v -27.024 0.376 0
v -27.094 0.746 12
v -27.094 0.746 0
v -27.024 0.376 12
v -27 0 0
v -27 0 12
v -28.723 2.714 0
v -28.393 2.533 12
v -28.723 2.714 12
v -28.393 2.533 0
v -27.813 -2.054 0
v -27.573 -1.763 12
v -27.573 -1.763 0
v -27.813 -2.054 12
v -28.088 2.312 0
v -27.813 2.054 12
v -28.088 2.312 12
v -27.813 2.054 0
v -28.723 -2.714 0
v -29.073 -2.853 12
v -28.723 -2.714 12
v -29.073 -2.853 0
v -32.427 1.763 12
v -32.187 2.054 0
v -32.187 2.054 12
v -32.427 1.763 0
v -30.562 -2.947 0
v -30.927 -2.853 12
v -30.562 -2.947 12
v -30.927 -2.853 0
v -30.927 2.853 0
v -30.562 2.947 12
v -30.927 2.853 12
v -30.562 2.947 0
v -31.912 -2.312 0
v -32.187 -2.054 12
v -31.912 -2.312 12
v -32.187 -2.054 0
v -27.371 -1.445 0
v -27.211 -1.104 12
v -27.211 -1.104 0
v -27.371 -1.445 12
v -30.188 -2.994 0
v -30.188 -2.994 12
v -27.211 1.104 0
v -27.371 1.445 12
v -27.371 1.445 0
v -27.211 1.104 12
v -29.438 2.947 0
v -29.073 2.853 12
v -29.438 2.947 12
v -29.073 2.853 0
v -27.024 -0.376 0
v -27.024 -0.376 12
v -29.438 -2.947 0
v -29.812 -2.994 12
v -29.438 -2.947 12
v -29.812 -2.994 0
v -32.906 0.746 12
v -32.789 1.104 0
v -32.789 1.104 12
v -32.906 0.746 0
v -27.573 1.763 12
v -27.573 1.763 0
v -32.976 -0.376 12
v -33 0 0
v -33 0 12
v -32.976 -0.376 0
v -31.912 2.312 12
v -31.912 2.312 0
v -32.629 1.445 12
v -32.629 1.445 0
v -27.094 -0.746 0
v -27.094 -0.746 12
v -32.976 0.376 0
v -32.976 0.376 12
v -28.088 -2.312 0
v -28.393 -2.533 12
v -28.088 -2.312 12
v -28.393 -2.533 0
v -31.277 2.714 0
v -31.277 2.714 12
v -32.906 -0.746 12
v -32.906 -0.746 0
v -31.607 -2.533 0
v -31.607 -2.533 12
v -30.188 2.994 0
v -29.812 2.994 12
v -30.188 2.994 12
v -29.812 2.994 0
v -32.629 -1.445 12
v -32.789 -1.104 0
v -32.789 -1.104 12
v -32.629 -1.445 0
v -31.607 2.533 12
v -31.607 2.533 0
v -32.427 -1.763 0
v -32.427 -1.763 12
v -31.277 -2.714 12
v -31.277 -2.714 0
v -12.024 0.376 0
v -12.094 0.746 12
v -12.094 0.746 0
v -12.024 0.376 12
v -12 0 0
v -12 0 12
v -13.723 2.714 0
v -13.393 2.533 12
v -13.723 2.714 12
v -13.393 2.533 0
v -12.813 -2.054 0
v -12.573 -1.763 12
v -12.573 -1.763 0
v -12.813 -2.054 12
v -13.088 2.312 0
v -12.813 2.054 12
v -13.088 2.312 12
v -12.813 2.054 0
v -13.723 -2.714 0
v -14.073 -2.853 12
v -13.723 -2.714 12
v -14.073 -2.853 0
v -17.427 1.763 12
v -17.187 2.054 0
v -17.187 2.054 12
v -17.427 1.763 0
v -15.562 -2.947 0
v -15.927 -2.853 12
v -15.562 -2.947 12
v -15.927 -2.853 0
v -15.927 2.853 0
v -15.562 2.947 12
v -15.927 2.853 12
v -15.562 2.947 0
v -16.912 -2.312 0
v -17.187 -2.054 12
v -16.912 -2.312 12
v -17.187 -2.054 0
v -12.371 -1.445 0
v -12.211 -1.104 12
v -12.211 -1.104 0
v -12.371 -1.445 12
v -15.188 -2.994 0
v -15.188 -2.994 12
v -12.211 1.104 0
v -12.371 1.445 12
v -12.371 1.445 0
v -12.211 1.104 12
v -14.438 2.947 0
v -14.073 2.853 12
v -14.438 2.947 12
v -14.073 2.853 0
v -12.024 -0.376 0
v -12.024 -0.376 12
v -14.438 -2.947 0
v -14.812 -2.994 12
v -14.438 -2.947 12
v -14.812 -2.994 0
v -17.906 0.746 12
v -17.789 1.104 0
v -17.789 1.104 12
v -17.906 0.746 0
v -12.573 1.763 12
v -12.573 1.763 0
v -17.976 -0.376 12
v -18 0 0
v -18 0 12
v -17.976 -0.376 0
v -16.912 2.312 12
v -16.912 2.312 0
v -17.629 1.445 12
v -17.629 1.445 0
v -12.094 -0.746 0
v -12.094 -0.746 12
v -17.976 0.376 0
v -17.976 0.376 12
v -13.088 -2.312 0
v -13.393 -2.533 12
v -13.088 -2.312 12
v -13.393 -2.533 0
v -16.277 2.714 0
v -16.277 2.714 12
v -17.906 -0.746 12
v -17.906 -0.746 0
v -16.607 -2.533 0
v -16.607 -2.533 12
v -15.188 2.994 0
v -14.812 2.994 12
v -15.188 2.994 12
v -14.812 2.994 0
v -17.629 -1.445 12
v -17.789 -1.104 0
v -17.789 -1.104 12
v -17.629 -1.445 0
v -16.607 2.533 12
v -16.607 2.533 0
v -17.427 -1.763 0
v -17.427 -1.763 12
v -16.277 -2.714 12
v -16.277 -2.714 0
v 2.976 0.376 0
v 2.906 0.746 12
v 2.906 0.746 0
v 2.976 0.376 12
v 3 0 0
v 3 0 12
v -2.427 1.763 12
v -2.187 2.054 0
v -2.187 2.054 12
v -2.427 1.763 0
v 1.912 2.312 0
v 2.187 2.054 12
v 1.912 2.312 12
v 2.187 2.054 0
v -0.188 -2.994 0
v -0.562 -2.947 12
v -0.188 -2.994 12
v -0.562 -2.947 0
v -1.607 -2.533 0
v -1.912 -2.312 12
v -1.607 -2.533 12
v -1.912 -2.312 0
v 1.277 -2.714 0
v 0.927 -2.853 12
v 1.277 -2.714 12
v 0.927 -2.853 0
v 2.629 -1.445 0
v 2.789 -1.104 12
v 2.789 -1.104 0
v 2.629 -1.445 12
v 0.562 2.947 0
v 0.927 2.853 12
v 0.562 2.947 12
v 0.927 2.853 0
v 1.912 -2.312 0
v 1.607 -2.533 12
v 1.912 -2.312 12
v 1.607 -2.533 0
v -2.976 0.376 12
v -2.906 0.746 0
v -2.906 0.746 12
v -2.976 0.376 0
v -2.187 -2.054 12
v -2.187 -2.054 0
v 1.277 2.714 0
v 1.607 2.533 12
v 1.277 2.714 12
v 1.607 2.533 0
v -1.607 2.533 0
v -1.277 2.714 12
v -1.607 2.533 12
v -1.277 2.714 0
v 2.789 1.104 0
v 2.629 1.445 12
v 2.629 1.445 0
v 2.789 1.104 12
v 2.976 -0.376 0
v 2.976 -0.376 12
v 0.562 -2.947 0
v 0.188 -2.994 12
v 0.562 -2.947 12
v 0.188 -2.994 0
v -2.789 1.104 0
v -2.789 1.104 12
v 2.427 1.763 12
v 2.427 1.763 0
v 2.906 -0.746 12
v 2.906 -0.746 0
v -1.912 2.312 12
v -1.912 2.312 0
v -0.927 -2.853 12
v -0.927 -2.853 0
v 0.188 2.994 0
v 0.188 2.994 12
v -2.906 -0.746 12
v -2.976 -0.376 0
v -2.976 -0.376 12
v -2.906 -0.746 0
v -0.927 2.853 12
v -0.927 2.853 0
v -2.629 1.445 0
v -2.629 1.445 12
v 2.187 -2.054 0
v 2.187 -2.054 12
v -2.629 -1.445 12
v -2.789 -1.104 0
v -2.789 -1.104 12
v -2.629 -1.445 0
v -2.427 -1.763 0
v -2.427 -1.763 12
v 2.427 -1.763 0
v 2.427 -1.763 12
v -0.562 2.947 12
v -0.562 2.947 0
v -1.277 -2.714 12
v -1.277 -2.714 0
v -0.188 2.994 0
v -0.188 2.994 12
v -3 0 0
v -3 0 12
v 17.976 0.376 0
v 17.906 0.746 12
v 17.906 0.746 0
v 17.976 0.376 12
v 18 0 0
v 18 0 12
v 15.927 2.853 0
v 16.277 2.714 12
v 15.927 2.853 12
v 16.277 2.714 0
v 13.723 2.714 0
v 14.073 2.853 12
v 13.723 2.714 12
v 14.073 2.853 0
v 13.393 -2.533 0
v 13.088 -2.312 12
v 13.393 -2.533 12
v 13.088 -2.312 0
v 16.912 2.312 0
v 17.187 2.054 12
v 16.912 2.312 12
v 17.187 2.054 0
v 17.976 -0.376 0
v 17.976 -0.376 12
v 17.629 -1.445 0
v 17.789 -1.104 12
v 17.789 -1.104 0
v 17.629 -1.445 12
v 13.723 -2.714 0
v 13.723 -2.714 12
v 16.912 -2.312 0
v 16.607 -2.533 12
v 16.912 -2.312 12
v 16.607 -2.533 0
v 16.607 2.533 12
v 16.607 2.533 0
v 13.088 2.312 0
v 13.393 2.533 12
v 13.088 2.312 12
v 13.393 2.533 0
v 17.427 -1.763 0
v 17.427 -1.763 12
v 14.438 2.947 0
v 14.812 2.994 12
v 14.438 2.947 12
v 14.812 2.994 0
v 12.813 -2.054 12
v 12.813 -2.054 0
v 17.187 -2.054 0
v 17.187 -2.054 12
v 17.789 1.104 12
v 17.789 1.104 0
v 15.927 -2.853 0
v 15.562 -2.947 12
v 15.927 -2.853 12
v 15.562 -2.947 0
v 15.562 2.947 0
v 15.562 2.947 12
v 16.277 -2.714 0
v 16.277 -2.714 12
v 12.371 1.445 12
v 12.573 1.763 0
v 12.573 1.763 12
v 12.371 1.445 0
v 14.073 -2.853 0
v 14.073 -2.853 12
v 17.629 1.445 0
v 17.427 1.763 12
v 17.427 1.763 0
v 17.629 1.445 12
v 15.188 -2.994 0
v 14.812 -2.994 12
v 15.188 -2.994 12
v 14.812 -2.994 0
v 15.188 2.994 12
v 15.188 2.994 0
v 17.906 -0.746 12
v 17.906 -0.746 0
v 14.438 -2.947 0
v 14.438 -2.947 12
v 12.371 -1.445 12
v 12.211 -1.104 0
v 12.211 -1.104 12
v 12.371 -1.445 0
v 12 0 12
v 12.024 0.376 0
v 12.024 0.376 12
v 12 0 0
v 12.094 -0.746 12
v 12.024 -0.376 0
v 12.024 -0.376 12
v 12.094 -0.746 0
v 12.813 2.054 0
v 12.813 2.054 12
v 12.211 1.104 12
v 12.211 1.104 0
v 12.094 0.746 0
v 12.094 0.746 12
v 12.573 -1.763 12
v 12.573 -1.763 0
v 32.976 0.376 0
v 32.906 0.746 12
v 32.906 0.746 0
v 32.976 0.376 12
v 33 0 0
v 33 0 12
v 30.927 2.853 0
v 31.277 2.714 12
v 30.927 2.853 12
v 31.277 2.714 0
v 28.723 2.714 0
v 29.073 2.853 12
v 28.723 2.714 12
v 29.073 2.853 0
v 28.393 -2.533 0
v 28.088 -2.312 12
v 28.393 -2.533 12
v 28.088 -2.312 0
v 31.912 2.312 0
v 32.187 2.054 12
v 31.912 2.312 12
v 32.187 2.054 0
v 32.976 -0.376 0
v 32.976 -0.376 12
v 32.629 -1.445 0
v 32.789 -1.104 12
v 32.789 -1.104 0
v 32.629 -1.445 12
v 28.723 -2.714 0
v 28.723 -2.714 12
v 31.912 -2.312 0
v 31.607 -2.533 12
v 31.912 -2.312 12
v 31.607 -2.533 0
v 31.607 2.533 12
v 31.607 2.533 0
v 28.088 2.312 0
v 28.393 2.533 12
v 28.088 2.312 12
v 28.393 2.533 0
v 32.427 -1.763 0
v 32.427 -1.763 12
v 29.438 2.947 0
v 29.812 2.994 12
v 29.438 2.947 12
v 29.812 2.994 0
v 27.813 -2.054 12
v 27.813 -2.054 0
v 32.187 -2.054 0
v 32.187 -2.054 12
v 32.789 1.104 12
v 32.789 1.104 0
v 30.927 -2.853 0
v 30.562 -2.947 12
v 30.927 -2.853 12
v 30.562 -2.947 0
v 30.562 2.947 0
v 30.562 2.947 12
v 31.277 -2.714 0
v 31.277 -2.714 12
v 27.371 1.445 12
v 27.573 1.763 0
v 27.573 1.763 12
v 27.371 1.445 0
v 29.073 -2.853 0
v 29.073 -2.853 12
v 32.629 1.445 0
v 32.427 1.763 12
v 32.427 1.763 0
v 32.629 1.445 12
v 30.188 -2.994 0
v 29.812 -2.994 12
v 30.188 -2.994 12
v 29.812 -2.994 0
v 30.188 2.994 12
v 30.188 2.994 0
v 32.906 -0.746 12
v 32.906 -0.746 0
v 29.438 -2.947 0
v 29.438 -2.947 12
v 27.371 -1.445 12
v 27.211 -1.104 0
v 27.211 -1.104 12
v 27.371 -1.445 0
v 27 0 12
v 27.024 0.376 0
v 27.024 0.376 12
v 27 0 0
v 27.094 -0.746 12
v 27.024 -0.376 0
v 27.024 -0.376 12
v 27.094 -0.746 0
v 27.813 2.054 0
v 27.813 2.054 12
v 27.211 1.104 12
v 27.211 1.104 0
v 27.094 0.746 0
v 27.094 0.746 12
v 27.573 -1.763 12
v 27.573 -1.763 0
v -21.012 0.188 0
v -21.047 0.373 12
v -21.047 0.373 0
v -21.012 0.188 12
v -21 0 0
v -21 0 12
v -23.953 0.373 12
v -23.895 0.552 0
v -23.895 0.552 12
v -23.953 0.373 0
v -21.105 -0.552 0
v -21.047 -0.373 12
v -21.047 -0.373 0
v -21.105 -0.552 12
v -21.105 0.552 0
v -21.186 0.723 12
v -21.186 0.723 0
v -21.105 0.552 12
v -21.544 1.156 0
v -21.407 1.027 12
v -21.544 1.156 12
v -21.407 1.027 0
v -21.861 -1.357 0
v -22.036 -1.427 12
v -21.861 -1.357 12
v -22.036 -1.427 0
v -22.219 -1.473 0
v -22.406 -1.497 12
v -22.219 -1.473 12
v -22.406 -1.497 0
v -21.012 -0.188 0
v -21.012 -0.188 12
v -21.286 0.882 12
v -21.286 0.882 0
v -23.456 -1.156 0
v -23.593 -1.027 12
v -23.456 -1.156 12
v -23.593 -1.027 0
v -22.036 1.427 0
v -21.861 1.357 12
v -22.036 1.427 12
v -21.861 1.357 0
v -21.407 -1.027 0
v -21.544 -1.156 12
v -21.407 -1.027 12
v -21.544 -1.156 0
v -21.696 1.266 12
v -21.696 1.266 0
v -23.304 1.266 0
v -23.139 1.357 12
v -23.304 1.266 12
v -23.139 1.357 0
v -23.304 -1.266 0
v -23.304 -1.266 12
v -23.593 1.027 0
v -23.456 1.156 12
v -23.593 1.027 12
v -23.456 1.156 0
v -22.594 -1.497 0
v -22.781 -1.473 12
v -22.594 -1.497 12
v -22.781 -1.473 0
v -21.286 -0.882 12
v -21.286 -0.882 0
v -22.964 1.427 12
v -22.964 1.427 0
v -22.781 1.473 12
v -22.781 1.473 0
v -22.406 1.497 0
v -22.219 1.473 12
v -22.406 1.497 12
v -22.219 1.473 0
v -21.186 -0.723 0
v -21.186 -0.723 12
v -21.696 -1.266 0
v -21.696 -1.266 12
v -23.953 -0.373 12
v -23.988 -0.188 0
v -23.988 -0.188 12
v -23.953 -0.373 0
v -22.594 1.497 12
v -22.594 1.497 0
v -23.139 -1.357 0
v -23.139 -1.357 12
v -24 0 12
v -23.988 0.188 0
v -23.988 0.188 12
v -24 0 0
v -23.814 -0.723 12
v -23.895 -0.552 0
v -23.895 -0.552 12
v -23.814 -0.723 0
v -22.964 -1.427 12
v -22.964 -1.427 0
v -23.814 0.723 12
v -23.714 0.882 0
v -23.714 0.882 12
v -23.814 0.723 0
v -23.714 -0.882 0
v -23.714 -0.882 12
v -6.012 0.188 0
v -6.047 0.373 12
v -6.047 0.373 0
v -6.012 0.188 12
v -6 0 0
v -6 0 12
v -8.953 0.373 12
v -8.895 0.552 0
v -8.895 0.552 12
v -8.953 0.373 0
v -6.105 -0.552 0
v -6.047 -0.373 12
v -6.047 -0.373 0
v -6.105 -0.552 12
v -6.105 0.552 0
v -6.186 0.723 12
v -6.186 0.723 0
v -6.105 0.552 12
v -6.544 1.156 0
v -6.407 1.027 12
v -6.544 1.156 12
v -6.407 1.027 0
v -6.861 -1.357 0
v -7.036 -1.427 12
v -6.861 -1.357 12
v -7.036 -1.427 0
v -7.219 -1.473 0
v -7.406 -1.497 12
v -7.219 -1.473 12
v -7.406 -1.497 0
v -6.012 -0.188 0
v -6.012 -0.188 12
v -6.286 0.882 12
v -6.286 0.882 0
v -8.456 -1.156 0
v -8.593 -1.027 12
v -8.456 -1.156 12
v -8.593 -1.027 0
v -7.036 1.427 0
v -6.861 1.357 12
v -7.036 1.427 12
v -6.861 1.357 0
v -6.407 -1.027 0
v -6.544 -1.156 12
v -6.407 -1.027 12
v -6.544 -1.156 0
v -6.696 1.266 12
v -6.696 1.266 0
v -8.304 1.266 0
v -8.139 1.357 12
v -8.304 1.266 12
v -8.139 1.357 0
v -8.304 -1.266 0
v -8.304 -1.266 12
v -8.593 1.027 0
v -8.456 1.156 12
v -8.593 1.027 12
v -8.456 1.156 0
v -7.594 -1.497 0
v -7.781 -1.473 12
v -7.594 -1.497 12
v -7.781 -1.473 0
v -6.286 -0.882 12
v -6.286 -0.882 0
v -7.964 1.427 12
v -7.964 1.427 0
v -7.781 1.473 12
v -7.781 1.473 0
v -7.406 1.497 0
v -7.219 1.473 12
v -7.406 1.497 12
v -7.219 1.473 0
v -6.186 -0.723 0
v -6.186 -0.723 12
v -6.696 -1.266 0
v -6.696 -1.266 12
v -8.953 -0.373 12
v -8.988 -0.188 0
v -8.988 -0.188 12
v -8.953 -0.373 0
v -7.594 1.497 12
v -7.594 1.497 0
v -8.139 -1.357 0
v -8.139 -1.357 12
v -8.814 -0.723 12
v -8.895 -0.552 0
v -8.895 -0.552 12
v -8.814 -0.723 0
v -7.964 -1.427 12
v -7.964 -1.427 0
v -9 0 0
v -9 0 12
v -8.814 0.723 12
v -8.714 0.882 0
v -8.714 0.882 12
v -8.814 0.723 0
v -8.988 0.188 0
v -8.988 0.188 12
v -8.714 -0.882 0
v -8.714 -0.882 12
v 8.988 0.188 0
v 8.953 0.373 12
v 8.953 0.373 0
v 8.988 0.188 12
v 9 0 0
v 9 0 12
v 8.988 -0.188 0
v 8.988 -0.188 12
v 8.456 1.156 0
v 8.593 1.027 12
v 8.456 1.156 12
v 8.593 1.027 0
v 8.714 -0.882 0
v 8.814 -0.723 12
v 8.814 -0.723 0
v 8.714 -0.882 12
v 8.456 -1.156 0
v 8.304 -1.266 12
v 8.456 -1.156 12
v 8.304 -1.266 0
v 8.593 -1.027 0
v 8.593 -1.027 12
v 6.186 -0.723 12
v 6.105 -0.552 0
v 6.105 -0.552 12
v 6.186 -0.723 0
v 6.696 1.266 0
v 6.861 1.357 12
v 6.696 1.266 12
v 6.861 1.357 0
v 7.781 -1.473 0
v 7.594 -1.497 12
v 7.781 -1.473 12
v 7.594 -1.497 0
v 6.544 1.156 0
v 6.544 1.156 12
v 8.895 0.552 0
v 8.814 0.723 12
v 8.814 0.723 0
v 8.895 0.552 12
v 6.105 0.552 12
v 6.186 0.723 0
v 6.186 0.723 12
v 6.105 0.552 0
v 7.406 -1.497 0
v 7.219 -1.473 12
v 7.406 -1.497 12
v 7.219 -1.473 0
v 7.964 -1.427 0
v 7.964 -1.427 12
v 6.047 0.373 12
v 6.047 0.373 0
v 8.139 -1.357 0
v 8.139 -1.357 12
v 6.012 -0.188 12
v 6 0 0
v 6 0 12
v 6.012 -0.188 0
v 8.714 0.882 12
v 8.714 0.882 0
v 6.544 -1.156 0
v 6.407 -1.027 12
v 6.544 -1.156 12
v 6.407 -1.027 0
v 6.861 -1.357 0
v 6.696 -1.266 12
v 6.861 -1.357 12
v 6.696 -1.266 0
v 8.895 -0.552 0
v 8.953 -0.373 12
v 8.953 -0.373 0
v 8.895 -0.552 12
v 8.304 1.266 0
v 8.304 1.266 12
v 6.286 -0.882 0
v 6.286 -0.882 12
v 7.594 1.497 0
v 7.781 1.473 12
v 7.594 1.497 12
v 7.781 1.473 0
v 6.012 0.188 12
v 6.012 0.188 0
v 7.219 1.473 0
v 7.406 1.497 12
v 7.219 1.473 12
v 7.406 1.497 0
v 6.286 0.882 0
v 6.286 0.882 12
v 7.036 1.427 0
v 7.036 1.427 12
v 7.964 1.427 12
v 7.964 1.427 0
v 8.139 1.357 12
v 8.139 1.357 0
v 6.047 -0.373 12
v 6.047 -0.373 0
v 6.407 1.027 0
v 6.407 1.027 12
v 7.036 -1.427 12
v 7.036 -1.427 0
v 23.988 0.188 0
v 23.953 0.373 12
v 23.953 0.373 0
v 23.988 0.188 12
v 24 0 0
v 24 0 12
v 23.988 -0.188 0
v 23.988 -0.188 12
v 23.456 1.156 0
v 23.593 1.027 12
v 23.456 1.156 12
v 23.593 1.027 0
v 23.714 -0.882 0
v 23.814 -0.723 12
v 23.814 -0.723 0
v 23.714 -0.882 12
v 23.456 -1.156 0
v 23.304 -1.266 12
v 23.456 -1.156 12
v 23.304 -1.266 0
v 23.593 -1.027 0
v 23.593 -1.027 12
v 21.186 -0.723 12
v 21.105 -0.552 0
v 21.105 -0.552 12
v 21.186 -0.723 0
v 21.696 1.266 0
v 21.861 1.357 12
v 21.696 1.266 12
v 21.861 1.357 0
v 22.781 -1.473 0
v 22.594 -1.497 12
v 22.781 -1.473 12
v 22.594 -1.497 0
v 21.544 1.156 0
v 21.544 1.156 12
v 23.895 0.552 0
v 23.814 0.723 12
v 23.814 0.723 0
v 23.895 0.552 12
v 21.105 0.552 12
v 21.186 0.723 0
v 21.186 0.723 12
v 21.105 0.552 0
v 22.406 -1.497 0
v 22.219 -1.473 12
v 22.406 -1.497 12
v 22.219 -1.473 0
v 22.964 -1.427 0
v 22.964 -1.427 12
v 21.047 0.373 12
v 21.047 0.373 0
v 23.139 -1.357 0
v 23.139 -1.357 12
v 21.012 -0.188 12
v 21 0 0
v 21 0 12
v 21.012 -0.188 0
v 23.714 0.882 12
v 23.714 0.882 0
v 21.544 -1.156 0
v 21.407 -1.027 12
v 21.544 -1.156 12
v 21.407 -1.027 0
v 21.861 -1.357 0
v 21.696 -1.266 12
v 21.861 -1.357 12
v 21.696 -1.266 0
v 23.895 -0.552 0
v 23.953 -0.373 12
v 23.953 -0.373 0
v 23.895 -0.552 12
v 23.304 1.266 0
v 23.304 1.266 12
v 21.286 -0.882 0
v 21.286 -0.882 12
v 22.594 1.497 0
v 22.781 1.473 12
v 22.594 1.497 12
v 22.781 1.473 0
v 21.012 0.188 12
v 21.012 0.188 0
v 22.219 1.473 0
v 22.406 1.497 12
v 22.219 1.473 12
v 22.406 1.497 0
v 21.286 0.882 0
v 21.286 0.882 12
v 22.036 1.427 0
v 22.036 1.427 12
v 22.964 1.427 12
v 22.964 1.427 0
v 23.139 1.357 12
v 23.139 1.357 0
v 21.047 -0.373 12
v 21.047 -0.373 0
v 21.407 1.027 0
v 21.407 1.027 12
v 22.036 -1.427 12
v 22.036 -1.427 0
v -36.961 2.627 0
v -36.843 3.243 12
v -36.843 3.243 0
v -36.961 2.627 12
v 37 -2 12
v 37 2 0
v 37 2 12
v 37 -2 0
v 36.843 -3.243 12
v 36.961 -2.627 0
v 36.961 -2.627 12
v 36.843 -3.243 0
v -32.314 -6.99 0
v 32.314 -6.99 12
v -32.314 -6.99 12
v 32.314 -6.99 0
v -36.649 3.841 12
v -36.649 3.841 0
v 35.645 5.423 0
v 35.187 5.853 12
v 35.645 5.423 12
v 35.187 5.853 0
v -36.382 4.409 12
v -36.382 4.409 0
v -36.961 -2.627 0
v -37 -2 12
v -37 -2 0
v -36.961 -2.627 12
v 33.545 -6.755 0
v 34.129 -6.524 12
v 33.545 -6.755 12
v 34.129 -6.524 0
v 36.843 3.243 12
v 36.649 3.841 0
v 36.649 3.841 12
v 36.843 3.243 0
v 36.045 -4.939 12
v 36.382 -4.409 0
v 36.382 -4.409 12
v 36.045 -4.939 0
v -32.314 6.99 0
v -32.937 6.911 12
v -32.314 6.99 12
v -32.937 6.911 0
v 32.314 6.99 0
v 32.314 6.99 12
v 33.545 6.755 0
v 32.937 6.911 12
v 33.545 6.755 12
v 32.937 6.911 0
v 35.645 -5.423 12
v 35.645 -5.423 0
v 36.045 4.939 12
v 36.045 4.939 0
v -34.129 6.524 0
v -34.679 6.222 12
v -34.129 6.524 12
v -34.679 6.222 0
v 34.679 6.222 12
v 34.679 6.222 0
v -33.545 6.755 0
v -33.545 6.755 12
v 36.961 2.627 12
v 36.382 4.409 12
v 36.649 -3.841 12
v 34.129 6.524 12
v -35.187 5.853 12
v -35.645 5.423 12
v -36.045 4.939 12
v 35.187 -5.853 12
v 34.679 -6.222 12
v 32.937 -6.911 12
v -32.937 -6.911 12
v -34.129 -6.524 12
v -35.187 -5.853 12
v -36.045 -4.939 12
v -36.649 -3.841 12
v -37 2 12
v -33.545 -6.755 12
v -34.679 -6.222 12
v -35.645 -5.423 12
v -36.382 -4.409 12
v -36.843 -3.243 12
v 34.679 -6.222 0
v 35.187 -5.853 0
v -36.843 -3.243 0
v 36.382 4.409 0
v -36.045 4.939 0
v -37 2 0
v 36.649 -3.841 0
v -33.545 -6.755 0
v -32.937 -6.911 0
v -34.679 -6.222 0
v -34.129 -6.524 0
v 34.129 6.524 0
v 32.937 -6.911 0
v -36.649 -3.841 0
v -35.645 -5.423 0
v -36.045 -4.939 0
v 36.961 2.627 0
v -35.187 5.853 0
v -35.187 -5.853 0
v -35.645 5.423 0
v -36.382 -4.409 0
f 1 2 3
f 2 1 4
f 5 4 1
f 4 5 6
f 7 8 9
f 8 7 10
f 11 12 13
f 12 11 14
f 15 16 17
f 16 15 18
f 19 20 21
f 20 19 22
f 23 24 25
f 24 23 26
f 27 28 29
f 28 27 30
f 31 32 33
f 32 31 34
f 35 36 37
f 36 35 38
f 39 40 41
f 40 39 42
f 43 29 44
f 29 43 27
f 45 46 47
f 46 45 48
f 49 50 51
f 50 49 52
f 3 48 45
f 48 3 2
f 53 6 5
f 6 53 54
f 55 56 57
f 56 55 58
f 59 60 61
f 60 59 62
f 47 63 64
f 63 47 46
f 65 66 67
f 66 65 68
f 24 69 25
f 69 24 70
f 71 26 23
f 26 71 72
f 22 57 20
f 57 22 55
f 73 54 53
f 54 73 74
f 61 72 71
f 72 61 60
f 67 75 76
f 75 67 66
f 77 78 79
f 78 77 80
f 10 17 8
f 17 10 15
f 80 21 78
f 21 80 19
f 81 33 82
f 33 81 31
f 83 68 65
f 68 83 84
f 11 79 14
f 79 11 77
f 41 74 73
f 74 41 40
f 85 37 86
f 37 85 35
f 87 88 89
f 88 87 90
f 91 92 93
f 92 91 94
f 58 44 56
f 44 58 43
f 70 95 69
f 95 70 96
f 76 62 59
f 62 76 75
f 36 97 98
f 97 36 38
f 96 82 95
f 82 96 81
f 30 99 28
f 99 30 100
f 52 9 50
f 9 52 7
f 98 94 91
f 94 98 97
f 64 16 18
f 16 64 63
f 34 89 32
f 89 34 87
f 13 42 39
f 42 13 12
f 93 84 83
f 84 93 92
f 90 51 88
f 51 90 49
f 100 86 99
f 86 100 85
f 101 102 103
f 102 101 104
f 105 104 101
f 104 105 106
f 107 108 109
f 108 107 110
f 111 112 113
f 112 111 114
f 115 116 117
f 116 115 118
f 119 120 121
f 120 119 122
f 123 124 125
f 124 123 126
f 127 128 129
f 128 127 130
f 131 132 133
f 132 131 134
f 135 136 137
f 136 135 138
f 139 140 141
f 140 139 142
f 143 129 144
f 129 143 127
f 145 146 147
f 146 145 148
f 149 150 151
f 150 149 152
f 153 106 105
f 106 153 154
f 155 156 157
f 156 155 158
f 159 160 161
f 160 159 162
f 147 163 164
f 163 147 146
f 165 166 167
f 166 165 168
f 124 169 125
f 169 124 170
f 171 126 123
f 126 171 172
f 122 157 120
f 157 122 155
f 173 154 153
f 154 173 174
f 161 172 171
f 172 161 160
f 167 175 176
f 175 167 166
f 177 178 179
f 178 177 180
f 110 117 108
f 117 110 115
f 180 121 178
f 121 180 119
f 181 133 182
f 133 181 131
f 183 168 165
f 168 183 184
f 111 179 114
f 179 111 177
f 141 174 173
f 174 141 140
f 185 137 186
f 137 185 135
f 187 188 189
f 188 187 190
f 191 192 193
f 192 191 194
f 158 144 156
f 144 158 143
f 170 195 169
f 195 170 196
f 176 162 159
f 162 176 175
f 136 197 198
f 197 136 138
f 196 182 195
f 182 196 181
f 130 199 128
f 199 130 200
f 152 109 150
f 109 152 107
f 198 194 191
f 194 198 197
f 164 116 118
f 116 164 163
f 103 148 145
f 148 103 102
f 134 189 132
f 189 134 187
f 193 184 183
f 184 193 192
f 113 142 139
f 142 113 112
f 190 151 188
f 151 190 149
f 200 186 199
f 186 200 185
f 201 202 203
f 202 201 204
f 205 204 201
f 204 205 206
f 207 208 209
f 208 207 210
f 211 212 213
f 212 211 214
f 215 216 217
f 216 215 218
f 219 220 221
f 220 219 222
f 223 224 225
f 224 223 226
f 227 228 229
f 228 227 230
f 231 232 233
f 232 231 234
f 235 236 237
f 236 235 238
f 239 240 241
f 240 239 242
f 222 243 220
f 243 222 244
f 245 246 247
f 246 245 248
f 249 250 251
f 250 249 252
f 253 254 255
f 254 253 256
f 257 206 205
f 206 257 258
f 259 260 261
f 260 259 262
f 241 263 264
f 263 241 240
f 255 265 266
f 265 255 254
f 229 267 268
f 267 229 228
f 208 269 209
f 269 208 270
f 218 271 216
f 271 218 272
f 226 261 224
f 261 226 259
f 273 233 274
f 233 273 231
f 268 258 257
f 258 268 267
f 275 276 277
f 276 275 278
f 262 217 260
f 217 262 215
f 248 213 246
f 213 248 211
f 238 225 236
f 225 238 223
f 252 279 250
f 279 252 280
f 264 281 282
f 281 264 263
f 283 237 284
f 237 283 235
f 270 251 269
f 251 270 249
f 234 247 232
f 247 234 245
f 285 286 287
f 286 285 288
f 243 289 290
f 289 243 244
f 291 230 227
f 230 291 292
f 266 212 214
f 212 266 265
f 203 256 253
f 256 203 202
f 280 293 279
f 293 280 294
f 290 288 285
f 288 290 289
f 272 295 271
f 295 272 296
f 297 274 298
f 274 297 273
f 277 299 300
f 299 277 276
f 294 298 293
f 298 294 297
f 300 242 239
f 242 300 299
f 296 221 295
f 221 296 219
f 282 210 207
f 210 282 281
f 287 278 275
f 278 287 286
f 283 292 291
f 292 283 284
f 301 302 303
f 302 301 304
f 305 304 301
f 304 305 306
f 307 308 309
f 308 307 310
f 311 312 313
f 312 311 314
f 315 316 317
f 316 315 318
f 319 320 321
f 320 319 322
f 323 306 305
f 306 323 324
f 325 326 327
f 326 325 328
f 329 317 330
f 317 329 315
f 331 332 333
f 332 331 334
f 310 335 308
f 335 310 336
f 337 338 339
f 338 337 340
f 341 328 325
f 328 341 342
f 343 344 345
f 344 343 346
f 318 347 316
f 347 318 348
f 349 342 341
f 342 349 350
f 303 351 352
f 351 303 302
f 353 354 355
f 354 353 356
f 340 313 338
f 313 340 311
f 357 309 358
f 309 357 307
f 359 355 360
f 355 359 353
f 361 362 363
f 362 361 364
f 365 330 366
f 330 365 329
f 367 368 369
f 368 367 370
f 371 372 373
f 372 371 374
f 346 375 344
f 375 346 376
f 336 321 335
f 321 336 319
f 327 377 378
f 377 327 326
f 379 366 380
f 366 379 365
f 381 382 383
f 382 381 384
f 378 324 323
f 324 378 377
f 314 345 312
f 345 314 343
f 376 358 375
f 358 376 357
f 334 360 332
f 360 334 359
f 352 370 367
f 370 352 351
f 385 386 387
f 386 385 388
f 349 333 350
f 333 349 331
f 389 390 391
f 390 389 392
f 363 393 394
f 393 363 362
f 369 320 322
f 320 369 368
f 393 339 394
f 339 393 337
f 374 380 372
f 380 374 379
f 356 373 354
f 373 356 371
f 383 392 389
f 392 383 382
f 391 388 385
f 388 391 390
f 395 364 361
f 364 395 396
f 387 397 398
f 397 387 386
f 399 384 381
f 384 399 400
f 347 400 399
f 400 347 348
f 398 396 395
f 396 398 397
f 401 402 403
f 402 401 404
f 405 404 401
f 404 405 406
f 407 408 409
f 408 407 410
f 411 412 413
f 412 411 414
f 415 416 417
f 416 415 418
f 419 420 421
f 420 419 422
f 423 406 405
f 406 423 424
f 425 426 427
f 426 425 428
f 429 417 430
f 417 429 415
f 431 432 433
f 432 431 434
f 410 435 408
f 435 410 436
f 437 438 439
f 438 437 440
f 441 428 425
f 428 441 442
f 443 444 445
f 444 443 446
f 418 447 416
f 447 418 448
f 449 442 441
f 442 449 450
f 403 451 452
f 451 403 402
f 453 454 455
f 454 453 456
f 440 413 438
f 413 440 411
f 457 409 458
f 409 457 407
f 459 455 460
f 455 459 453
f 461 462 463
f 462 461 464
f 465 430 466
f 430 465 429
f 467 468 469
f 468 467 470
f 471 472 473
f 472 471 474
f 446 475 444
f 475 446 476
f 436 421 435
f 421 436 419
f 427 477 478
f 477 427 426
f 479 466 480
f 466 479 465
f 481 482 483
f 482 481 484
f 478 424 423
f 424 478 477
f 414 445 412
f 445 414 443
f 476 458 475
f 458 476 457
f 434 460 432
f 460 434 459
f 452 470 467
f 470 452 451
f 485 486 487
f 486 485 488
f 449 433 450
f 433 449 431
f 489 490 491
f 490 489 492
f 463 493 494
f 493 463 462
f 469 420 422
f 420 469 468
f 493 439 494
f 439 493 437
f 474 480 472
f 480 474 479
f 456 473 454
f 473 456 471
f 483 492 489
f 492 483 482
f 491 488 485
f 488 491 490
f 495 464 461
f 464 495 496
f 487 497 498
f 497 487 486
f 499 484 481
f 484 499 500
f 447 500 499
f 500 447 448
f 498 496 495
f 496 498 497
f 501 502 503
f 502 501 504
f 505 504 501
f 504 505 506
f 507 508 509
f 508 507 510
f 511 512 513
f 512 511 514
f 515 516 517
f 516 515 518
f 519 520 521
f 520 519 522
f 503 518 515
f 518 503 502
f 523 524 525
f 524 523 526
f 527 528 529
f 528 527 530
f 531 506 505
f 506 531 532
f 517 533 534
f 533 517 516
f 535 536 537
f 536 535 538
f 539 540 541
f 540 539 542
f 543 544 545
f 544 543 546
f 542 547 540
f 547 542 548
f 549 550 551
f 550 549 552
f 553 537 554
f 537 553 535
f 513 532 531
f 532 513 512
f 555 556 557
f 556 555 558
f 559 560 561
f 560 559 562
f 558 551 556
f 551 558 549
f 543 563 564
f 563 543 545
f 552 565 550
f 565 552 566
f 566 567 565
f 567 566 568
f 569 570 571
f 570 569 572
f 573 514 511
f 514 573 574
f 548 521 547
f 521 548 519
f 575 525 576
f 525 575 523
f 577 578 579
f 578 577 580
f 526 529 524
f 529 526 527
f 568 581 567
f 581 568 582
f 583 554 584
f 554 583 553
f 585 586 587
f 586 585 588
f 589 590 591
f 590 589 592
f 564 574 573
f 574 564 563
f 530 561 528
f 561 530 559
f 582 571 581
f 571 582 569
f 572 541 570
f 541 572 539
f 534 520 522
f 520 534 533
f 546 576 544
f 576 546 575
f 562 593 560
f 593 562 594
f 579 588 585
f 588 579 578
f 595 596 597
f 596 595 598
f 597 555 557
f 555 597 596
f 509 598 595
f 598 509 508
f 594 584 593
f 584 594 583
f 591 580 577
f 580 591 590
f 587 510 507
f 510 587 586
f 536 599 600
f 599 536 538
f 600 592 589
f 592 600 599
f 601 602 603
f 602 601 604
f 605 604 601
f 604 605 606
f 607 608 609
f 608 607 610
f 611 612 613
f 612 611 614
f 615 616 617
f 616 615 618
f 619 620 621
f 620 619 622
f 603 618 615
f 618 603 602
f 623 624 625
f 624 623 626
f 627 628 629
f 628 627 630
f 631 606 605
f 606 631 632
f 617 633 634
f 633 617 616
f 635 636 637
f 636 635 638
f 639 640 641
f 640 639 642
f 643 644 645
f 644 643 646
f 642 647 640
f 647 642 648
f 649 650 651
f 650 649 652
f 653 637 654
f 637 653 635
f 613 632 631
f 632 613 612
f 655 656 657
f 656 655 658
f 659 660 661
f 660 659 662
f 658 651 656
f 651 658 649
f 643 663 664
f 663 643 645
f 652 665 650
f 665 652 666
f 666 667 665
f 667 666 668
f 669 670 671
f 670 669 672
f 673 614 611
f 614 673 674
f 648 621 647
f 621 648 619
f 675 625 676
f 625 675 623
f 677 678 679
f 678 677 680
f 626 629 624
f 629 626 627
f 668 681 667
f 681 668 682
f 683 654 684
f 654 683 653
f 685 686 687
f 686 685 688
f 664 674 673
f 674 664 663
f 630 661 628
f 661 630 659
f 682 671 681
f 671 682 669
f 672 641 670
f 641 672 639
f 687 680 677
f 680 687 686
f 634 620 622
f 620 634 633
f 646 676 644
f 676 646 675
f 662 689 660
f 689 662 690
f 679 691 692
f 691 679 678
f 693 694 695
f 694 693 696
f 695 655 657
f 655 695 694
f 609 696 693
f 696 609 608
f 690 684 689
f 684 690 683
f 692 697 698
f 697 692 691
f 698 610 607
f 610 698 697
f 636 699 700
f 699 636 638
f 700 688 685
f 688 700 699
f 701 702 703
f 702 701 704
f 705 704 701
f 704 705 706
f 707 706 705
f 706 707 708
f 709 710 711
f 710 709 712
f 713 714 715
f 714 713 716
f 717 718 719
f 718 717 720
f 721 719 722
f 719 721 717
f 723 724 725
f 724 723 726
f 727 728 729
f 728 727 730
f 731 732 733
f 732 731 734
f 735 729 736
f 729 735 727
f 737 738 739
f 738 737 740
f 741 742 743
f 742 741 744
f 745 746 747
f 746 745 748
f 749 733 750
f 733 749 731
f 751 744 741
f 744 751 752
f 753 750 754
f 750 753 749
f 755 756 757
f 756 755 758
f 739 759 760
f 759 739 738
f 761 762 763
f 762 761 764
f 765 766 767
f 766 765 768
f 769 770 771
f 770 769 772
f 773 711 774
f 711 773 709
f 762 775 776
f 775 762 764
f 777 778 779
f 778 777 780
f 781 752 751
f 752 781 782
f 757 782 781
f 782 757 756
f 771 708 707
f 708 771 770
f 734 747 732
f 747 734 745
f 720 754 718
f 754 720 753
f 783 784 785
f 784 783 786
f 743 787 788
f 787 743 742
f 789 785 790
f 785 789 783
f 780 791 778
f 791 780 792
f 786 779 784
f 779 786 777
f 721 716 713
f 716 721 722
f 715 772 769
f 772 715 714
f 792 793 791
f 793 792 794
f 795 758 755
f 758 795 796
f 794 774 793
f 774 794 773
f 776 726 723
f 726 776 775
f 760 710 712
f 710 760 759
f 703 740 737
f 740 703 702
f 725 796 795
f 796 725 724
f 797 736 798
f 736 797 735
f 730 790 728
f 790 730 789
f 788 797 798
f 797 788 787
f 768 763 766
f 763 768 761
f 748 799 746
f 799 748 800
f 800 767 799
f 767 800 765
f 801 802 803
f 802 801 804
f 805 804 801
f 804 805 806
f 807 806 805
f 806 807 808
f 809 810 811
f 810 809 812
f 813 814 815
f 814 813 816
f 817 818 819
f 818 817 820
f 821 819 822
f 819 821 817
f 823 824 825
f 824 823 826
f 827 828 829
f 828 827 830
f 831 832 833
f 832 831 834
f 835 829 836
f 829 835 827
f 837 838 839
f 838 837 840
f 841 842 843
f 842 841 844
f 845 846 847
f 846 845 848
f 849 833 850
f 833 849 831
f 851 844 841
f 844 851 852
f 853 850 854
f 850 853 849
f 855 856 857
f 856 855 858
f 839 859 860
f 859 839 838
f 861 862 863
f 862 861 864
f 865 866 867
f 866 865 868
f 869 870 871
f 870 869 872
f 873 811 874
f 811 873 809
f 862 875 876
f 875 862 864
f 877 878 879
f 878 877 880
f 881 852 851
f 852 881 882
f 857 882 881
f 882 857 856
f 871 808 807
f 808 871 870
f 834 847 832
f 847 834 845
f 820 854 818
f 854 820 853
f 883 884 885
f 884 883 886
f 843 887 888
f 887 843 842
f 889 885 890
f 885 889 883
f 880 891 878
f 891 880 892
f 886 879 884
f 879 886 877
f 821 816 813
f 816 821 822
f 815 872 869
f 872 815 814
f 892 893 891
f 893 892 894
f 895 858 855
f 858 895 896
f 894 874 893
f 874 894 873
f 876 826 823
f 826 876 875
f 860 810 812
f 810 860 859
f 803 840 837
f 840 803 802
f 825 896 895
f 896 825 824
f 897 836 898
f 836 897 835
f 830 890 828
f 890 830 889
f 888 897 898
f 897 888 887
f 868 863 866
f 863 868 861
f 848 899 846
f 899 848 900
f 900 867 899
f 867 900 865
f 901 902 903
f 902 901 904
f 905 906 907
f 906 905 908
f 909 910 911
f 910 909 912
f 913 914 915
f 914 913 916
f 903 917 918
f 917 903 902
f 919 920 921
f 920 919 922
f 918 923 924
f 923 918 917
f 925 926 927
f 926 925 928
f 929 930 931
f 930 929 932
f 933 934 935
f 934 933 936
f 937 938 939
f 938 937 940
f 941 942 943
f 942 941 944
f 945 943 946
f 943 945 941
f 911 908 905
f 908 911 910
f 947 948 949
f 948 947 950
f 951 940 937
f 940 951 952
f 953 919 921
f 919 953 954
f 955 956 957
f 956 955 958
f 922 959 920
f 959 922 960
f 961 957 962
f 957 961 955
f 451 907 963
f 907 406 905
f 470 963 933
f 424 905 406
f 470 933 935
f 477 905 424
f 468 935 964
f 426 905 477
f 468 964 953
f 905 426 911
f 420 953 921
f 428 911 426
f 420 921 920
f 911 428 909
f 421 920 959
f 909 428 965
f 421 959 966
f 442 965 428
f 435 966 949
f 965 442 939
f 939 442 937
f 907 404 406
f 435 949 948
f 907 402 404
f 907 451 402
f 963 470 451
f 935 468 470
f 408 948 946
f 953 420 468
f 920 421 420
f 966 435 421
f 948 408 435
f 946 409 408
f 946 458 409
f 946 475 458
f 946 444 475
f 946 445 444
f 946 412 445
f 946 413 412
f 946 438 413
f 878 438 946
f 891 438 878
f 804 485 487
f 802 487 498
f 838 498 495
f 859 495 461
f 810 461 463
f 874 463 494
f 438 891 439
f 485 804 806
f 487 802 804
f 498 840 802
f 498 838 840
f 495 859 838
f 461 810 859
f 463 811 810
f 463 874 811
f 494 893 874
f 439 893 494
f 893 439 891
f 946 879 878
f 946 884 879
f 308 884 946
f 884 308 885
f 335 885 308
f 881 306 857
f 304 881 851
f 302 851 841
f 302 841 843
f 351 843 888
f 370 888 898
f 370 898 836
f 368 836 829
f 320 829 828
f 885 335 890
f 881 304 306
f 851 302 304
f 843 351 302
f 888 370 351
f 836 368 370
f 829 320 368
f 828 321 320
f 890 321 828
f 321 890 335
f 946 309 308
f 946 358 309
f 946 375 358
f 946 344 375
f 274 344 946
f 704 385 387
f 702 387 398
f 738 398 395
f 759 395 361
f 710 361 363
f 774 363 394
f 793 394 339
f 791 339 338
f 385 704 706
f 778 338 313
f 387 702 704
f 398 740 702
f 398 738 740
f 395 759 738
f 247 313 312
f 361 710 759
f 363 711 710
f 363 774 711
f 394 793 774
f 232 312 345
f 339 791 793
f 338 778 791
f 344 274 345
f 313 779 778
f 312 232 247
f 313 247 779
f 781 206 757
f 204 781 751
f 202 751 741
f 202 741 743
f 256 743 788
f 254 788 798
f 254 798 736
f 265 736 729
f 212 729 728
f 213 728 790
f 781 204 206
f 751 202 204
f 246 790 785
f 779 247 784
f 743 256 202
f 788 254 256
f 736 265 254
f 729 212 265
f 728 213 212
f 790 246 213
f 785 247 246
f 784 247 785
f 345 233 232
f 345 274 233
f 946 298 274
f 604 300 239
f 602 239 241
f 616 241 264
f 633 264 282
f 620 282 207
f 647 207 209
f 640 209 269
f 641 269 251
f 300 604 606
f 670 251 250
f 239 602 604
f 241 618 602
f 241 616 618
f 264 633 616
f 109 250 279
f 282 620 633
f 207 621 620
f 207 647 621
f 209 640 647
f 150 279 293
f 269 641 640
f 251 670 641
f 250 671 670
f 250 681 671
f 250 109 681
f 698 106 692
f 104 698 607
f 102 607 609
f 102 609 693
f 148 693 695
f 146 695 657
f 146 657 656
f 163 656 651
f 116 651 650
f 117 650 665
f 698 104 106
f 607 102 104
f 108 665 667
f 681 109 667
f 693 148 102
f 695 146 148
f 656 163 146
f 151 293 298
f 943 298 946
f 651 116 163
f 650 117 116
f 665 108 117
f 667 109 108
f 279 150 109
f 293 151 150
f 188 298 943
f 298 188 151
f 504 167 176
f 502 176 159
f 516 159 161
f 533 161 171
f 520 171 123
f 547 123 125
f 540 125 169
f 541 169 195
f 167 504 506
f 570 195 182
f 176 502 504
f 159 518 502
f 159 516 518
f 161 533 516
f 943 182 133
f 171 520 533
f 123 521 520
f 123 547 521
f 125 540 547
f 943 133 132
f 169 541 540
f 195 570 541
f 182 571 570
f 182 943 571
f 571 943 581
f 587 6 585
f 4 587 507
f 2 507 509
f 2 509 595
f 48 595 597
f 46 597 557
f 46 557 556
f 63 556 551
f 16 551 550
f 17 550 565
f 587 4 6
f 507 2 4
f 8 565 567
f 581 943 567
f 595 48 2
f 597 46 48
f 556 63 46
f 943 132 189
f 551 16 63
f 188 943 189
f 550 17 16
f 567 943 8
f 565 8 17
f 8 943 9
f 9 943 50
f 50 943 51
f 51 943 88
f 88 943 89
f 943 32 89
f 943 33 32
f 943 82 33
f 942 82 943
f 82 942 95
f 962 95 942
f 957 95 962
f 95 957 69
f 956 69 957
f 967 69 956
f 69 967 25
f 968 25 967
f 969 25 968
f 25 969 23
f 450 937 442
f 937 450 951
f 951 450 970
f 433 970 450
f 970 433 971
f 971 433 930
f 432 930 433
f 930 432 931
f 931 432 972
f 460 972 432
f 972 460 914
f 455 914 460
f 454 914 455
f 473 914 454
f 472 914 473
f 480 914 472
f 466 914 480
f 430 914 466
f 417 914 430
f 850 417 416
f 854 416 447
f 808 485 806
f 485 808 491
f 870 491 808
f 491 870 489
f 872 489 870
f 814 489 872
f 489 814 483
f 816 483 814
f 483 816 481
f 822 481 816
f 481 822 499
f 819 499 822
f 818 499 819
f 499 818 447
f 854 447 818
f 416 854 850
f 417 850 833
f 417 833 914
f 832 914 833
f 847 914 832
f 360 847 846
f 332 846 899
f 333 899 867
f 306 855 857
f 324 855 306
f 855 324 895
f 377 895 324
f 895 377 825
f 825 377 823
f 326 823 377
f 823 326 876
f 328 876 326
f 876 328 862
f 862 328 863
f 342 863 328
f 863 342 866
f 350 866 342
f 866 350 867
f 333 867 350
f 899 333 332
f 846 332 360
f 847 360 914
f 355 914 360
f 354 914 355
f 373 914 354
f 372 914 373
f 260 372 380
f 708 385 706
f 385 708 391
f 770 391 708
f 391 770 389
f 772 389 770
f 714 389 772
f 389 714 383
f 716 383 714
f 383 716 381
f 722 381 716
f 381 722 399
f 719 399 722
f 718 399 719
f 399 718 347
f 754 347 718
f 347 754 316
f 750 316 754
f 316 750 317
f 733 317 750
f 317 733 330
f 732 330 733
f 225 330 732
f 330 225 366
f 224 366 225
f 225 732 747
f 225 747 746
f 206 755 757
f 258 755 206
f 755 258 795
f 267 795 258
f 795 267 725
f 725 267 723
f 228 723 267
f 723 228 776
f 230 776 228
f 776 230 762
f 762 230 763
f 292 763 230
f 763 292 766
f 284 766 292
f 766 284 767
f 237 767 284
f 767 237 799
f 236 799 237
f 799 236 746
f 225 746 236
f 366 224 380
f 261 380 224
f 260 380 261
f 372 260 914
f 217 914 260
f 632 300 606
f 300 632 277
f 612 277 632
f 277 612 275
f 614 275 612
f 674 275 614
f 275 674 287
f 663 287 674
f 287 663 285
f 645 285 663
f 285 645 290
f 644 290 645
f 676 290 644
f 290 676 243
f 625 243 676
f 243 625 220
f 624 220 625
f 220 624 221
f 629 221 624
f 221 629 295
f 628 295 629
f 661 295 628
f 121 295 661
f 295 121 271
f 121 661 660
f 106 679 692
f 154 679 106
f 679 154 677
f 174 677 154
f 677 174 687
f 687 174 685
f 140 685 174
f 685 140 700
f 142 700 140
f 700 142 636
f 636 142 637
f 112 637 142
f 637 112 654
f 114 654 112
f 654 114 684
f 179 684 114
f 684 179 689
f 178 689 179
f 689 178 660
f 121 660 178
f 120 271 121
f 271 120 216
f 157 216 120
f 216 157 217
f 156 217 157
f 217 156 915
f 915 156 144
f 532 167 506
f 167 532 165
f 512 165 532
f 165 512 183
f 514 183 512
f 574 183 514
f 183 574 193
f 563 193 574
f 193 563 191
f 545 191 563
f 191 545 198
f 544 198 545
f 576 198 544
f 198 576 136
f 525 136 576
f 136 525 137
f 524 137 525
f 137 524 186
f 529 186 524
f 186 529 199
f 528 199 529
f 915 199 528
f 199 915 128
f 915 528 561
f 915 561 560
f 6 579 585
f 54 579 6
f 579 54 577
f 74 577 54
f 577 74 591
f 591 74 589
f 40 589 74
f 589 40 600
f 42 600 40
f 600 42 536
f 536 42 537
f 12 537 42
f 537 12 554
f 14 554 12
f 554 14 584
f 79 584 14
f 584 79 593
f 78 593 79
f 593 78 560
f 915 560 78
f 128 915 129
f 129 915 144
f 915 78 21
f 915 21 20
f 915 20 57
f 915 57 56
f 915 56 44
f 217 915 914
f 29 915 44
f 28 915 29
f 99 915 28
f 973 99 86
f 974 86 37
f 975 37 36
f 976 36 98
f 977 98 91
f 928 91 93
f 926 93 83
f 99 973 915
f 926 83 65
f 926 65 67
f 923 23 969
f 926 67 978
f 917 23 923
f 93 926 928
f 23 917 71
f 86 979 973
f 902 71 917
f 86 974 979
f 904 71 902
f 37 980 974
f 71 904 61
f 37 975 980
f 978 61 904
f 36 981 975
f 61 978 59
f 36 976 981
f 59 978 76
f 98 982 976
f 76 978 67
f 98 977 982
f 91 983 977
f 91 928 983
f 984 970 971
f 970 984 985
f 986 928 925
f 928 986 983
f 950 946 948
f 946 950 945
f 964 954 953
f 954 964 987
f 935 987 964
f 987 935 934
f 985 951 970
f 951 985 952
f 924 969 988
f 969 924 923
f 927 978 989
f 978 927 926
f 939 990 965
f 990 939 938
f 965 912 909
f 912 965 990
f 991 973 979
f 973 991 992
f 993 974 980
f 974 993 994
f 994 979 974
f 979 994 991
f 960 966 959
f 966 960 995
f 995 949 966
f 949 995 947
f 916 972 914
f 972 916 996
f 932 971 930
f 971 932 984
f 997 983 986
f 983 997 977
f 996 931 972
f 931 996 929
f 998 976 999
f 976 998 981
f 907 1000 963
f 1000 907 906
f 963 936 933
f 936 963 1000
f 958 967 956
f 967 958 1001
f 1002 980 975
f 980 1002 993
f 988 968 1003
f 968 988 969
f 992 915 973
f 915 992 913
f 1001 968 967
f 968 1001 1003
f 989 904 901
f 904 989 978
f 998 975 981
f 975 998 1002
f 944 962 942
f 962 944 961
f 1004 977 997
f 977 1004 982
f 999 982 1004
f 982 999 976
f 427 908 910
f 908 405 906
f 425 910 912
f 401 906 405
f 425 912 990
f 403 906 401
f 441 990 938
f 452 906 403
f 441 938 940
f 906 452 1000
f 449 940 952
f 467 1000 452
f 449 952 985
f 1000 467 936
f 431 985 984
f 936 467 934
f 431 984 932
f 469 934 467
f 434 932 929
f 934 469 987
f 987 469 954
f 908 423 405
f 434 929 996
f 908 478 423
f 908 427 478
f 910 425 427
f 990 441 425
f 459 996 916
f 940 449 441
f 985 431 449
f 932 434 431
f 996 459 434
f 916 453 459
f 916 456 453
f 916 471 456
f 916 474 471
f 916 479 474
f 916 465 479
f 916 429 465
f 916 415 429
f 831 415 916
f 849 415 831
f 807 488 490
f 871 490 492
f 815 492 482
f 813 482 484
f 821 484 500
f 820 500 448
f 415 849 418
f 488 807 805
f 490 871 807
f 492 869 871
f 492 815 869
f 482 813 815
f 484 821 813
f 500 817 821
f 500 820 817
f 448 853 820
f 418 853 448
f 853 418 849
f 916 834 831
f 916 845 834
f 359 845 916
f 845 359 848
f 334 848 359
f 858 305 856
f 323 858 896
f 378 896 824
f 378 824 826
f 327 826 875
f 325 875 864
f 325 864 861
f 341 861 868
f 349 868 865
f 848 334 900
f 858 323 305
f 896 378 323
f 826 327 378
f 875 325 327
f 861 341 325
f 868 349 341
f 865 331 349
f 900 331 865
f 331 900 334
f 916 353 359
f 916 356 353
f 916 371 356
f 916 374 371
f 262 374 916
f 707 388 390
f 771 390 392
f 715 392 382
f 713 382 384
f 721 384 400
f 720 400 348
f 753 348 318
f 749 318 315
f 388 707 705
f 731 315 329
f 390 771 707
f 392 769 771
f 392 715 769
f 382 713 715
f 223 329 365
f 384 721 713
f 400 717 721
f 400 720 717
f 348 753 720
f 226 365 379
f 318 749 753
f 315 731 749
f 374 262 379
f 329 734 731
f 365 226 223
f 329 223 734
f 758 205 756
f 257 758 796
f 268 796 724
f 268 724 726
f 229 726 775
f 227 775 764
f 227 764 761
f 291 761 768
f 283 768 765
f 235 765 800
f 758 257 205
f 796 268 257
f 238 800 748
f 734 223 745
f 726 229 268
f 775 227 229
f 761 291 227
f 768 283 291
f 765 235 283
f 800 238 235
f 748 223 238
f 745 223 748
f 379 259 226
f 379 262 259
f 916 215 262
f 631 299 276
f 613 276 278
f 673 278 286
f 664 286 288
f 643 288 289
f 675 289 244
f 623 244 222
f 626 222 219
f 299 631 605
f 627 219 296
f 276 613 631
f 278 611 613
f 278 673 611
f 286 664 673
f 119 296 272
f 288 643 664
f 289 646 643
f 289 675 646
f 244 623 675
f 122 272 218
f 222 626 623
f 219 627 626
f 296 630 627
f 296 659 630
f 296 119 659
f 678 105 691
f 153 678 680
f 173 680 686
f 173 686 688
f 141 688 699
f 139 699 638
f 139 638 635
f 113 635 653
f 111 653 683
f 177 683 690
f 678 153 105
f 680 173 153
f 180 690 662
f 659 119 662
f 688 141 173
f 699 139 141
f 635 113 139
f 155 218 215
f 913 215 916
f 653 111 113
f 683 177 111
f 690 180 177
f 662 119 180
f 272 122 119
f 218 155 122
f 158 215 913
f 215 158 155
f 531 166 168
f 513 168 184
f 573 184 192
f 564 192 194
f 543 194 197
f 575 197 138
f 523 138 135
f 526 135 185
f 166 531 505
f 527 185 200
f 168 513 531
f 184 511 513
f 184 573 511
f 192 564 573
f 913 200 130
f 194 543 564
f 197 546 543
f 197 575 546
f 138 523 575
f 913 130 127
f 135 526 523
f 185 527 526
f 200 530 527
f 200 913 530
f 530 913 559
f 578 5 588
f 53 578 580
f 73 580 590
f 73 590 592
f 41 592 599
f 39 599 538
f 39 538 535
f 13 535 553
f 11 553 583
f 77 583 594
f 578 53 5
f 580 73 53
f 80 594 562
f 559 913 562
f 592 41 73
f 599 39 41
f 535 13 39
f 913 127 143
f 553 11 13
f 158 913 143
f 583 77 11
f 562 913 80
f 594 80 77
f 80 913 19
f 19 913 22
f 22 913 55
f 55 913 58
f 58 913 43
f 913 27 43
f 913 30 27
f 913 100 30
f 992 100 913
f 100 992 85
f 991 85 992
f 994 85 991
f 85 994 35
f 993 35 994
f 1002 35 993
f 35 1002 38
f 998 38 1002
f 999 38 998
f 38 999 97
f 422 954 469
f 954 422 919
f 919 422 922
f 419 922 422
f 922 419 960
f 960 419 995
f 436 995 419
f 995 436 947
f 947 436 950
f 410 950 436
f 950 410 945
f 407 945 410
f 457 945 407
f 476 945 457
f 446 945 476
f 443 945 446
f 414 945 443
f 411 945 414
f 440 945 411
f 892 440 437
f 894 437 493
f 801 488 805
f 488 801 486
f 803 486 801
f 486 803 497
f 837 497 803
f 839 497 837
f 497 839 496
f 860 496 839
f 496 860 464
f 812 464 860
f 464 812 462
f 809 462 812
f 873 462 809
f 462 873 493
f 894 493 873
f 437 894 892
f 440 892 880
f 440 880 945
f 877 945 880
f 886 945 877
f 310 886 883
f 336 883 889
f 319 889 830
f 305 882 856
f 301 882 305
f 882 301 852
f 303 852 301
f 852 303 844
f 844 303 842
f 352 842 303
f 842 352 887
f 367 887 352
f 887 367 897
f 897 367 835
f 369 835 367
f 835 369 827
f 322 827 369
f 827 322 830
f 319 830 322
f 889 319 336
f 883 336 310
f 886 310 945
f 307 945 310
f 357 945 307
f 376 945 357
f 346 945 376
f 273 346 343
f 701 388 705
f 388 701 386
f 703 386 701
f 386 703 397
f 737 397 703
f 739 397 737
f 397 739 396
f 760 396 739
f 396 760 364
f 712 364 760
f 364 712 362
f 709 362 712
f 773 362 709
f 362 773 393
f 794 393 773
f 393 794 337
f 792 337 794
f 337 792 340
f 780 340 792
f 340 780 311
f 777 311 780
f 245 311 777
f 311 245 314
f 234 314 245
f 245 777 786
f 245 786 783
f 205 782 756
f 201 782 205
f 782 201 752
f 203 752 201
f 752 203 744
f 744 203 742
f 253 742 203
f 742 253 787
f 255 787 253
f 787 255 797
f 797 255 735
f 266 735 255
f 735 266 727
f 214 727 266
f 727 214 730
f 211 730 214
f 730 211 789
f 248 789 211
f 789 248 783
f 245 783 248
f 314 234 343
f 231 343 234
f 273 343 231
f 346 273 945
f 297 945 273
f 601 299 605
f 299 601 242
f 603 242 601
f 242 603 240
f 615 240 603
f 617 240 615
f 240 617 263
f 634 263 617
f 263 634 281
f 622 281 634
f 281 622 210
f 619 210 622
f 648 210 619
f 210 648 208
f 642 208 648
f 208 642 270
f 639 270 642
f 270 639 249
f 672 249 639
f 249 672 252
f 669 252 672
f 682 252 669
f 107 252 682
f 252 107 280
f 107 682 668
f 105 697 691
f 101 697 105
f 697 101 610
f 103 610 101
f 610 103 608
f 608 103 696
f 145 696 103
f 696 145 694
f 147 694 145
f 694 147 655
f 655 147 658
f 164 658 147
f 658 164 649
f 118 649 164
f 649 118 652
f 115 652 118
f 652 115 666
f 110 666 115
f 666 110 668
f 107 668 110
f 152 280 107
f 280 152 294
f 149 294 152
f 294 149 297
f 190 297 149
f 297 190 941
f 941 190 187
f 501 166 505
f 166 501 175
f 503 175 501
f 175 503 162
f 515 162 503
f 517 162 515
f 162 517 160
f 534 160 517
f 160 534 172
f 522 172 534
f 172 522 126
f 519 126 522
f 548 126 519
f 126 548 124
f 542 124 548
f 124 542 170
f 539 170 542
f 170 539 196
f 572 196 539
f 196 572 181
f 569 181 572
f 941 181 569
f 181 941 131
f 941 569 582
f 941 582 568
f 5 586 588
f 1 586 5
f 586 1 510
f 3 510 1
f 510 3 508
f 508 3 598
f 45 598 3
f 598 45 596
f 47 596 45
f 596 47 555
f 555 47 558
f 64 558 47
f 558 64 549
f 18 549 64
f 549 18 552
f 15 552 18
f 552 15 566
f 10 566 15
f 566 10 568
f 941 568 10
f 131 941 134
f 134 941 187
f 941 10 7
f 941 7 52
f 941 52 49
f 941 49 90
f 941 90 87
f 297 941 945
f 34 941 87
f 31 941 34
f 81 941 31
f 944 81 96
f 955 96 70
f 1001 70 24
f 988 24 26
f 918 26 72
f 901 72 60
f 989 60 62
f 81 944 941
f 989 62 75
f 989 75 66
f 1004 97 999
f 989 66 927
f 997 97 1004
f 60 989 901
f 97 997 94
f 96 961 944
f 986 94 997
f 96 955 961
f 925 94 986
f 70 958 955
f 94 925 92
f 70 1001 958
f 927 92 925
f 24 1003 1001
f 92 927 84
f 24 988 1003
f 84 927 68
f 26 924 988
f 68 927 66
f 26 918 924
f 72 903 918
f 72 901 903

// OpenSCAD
$fn = 50;


difference() {
	union() {
		hull() {
			translate(v = [-32.0000000000, 2.0000000000, 0]) {
				cylinder(h = 12, r = 5);
			}
			translate(v = [32.0000000000, 2.0000000000, 0]) {
				cylinder(h = 12, r = 5);
			}
			translate(v = [-32.0000000000, -2.0000000000, 0]) {
				cylinder(h = 12, r = 5);
			}
			translate(v = [32.0000000000, -2.0000000000, 0]) {
				cylinder(h = 12, r = 5);
			}
		}
	}
	union() {
		translate(v = [-30.0000000000, 0.0000000000, 0]) {
			translate(v = [0, 0, -100]) {
				cylinder(h = 200, r = 3.0000000000);
			}
		}
		translate(v = [-15.0000000000, 0.0000000000, 0]) {
			translate(v = [0, 0, -100]) {
				cylinder(h = 200, r = 3.0000000000);
			}
		}
		translate(v = [0, 0, -100]) {
			cylinder(h = 200, r = 3.0000000000);
		}
		translate(v = [15.0000000000, 0.0000000000, 0]) {
			translate(v = [0, 0, -100]) {
				cylinder(h = 200, r = 3.0000000000);
			}
		}
		translate(v = [30.0000000000, 0.0000000000, 0]) {
			translate(v = [0, 0, -100]) {
				cylinder(h = 200, r = 3.0000000000);
			}
		}
		translate(v = [-30.0000000000, 0.0000000000, 0]) {
			translate(v = [0, 0, -100]) {
				cylinder(h = 200, r = 1.5000000000);
			}
		}
		translate(v = [-22.5000000000, 0.0000000000, 0]) {
			translate(v = [0, 0, -100]) {
				cylinder(h = 200, r = 1.5000000000);
			}
		}
		translate(v = [-15.0000000000, 0.0000000000, 0]) {
			translate(v = [0, 0, -100]) {
				cylinder(h = 200, r = 1.5000000000);
			}
		}
		translate(v = [-7.5000000000, 0.0000000000, 0]) {
			translate(v = [0, 0, -100]) {
				cylinder(h = 200, r = 1.5000000000);
			}
		}
		translate(v = [0, 0, -100]) {
			cylinder(h = 200, r = 1.5000000000);
		}
		translate(v = [7.5000000000, 0.0000000000, 0]) {
			translate(v = [0, 0, -100]) {
				cylinder(h = 200, r = 1.5000000000);
			}
		}
		translate(v = [15.0000000000, 0.0000000000, 0]) {
			translate(v = [0, 0, -100]) {
				cylinder(h = 200, r = 1.5000000000);
			}
		}
		translate(v = [22.5000000000, 0.0000000000, 0]) {
			translate(v = [0, 0, -100]) {
				cylinder(h = 200, r = 1.5000000000);
			}
		}
		translate(v = [30.0000000000, 0.0000000000, 0]) {
			translate(v = [0, 0, -100]) {
				cylinder(h = 200, r = 1.5000000000);
			}
		}
	}
}
